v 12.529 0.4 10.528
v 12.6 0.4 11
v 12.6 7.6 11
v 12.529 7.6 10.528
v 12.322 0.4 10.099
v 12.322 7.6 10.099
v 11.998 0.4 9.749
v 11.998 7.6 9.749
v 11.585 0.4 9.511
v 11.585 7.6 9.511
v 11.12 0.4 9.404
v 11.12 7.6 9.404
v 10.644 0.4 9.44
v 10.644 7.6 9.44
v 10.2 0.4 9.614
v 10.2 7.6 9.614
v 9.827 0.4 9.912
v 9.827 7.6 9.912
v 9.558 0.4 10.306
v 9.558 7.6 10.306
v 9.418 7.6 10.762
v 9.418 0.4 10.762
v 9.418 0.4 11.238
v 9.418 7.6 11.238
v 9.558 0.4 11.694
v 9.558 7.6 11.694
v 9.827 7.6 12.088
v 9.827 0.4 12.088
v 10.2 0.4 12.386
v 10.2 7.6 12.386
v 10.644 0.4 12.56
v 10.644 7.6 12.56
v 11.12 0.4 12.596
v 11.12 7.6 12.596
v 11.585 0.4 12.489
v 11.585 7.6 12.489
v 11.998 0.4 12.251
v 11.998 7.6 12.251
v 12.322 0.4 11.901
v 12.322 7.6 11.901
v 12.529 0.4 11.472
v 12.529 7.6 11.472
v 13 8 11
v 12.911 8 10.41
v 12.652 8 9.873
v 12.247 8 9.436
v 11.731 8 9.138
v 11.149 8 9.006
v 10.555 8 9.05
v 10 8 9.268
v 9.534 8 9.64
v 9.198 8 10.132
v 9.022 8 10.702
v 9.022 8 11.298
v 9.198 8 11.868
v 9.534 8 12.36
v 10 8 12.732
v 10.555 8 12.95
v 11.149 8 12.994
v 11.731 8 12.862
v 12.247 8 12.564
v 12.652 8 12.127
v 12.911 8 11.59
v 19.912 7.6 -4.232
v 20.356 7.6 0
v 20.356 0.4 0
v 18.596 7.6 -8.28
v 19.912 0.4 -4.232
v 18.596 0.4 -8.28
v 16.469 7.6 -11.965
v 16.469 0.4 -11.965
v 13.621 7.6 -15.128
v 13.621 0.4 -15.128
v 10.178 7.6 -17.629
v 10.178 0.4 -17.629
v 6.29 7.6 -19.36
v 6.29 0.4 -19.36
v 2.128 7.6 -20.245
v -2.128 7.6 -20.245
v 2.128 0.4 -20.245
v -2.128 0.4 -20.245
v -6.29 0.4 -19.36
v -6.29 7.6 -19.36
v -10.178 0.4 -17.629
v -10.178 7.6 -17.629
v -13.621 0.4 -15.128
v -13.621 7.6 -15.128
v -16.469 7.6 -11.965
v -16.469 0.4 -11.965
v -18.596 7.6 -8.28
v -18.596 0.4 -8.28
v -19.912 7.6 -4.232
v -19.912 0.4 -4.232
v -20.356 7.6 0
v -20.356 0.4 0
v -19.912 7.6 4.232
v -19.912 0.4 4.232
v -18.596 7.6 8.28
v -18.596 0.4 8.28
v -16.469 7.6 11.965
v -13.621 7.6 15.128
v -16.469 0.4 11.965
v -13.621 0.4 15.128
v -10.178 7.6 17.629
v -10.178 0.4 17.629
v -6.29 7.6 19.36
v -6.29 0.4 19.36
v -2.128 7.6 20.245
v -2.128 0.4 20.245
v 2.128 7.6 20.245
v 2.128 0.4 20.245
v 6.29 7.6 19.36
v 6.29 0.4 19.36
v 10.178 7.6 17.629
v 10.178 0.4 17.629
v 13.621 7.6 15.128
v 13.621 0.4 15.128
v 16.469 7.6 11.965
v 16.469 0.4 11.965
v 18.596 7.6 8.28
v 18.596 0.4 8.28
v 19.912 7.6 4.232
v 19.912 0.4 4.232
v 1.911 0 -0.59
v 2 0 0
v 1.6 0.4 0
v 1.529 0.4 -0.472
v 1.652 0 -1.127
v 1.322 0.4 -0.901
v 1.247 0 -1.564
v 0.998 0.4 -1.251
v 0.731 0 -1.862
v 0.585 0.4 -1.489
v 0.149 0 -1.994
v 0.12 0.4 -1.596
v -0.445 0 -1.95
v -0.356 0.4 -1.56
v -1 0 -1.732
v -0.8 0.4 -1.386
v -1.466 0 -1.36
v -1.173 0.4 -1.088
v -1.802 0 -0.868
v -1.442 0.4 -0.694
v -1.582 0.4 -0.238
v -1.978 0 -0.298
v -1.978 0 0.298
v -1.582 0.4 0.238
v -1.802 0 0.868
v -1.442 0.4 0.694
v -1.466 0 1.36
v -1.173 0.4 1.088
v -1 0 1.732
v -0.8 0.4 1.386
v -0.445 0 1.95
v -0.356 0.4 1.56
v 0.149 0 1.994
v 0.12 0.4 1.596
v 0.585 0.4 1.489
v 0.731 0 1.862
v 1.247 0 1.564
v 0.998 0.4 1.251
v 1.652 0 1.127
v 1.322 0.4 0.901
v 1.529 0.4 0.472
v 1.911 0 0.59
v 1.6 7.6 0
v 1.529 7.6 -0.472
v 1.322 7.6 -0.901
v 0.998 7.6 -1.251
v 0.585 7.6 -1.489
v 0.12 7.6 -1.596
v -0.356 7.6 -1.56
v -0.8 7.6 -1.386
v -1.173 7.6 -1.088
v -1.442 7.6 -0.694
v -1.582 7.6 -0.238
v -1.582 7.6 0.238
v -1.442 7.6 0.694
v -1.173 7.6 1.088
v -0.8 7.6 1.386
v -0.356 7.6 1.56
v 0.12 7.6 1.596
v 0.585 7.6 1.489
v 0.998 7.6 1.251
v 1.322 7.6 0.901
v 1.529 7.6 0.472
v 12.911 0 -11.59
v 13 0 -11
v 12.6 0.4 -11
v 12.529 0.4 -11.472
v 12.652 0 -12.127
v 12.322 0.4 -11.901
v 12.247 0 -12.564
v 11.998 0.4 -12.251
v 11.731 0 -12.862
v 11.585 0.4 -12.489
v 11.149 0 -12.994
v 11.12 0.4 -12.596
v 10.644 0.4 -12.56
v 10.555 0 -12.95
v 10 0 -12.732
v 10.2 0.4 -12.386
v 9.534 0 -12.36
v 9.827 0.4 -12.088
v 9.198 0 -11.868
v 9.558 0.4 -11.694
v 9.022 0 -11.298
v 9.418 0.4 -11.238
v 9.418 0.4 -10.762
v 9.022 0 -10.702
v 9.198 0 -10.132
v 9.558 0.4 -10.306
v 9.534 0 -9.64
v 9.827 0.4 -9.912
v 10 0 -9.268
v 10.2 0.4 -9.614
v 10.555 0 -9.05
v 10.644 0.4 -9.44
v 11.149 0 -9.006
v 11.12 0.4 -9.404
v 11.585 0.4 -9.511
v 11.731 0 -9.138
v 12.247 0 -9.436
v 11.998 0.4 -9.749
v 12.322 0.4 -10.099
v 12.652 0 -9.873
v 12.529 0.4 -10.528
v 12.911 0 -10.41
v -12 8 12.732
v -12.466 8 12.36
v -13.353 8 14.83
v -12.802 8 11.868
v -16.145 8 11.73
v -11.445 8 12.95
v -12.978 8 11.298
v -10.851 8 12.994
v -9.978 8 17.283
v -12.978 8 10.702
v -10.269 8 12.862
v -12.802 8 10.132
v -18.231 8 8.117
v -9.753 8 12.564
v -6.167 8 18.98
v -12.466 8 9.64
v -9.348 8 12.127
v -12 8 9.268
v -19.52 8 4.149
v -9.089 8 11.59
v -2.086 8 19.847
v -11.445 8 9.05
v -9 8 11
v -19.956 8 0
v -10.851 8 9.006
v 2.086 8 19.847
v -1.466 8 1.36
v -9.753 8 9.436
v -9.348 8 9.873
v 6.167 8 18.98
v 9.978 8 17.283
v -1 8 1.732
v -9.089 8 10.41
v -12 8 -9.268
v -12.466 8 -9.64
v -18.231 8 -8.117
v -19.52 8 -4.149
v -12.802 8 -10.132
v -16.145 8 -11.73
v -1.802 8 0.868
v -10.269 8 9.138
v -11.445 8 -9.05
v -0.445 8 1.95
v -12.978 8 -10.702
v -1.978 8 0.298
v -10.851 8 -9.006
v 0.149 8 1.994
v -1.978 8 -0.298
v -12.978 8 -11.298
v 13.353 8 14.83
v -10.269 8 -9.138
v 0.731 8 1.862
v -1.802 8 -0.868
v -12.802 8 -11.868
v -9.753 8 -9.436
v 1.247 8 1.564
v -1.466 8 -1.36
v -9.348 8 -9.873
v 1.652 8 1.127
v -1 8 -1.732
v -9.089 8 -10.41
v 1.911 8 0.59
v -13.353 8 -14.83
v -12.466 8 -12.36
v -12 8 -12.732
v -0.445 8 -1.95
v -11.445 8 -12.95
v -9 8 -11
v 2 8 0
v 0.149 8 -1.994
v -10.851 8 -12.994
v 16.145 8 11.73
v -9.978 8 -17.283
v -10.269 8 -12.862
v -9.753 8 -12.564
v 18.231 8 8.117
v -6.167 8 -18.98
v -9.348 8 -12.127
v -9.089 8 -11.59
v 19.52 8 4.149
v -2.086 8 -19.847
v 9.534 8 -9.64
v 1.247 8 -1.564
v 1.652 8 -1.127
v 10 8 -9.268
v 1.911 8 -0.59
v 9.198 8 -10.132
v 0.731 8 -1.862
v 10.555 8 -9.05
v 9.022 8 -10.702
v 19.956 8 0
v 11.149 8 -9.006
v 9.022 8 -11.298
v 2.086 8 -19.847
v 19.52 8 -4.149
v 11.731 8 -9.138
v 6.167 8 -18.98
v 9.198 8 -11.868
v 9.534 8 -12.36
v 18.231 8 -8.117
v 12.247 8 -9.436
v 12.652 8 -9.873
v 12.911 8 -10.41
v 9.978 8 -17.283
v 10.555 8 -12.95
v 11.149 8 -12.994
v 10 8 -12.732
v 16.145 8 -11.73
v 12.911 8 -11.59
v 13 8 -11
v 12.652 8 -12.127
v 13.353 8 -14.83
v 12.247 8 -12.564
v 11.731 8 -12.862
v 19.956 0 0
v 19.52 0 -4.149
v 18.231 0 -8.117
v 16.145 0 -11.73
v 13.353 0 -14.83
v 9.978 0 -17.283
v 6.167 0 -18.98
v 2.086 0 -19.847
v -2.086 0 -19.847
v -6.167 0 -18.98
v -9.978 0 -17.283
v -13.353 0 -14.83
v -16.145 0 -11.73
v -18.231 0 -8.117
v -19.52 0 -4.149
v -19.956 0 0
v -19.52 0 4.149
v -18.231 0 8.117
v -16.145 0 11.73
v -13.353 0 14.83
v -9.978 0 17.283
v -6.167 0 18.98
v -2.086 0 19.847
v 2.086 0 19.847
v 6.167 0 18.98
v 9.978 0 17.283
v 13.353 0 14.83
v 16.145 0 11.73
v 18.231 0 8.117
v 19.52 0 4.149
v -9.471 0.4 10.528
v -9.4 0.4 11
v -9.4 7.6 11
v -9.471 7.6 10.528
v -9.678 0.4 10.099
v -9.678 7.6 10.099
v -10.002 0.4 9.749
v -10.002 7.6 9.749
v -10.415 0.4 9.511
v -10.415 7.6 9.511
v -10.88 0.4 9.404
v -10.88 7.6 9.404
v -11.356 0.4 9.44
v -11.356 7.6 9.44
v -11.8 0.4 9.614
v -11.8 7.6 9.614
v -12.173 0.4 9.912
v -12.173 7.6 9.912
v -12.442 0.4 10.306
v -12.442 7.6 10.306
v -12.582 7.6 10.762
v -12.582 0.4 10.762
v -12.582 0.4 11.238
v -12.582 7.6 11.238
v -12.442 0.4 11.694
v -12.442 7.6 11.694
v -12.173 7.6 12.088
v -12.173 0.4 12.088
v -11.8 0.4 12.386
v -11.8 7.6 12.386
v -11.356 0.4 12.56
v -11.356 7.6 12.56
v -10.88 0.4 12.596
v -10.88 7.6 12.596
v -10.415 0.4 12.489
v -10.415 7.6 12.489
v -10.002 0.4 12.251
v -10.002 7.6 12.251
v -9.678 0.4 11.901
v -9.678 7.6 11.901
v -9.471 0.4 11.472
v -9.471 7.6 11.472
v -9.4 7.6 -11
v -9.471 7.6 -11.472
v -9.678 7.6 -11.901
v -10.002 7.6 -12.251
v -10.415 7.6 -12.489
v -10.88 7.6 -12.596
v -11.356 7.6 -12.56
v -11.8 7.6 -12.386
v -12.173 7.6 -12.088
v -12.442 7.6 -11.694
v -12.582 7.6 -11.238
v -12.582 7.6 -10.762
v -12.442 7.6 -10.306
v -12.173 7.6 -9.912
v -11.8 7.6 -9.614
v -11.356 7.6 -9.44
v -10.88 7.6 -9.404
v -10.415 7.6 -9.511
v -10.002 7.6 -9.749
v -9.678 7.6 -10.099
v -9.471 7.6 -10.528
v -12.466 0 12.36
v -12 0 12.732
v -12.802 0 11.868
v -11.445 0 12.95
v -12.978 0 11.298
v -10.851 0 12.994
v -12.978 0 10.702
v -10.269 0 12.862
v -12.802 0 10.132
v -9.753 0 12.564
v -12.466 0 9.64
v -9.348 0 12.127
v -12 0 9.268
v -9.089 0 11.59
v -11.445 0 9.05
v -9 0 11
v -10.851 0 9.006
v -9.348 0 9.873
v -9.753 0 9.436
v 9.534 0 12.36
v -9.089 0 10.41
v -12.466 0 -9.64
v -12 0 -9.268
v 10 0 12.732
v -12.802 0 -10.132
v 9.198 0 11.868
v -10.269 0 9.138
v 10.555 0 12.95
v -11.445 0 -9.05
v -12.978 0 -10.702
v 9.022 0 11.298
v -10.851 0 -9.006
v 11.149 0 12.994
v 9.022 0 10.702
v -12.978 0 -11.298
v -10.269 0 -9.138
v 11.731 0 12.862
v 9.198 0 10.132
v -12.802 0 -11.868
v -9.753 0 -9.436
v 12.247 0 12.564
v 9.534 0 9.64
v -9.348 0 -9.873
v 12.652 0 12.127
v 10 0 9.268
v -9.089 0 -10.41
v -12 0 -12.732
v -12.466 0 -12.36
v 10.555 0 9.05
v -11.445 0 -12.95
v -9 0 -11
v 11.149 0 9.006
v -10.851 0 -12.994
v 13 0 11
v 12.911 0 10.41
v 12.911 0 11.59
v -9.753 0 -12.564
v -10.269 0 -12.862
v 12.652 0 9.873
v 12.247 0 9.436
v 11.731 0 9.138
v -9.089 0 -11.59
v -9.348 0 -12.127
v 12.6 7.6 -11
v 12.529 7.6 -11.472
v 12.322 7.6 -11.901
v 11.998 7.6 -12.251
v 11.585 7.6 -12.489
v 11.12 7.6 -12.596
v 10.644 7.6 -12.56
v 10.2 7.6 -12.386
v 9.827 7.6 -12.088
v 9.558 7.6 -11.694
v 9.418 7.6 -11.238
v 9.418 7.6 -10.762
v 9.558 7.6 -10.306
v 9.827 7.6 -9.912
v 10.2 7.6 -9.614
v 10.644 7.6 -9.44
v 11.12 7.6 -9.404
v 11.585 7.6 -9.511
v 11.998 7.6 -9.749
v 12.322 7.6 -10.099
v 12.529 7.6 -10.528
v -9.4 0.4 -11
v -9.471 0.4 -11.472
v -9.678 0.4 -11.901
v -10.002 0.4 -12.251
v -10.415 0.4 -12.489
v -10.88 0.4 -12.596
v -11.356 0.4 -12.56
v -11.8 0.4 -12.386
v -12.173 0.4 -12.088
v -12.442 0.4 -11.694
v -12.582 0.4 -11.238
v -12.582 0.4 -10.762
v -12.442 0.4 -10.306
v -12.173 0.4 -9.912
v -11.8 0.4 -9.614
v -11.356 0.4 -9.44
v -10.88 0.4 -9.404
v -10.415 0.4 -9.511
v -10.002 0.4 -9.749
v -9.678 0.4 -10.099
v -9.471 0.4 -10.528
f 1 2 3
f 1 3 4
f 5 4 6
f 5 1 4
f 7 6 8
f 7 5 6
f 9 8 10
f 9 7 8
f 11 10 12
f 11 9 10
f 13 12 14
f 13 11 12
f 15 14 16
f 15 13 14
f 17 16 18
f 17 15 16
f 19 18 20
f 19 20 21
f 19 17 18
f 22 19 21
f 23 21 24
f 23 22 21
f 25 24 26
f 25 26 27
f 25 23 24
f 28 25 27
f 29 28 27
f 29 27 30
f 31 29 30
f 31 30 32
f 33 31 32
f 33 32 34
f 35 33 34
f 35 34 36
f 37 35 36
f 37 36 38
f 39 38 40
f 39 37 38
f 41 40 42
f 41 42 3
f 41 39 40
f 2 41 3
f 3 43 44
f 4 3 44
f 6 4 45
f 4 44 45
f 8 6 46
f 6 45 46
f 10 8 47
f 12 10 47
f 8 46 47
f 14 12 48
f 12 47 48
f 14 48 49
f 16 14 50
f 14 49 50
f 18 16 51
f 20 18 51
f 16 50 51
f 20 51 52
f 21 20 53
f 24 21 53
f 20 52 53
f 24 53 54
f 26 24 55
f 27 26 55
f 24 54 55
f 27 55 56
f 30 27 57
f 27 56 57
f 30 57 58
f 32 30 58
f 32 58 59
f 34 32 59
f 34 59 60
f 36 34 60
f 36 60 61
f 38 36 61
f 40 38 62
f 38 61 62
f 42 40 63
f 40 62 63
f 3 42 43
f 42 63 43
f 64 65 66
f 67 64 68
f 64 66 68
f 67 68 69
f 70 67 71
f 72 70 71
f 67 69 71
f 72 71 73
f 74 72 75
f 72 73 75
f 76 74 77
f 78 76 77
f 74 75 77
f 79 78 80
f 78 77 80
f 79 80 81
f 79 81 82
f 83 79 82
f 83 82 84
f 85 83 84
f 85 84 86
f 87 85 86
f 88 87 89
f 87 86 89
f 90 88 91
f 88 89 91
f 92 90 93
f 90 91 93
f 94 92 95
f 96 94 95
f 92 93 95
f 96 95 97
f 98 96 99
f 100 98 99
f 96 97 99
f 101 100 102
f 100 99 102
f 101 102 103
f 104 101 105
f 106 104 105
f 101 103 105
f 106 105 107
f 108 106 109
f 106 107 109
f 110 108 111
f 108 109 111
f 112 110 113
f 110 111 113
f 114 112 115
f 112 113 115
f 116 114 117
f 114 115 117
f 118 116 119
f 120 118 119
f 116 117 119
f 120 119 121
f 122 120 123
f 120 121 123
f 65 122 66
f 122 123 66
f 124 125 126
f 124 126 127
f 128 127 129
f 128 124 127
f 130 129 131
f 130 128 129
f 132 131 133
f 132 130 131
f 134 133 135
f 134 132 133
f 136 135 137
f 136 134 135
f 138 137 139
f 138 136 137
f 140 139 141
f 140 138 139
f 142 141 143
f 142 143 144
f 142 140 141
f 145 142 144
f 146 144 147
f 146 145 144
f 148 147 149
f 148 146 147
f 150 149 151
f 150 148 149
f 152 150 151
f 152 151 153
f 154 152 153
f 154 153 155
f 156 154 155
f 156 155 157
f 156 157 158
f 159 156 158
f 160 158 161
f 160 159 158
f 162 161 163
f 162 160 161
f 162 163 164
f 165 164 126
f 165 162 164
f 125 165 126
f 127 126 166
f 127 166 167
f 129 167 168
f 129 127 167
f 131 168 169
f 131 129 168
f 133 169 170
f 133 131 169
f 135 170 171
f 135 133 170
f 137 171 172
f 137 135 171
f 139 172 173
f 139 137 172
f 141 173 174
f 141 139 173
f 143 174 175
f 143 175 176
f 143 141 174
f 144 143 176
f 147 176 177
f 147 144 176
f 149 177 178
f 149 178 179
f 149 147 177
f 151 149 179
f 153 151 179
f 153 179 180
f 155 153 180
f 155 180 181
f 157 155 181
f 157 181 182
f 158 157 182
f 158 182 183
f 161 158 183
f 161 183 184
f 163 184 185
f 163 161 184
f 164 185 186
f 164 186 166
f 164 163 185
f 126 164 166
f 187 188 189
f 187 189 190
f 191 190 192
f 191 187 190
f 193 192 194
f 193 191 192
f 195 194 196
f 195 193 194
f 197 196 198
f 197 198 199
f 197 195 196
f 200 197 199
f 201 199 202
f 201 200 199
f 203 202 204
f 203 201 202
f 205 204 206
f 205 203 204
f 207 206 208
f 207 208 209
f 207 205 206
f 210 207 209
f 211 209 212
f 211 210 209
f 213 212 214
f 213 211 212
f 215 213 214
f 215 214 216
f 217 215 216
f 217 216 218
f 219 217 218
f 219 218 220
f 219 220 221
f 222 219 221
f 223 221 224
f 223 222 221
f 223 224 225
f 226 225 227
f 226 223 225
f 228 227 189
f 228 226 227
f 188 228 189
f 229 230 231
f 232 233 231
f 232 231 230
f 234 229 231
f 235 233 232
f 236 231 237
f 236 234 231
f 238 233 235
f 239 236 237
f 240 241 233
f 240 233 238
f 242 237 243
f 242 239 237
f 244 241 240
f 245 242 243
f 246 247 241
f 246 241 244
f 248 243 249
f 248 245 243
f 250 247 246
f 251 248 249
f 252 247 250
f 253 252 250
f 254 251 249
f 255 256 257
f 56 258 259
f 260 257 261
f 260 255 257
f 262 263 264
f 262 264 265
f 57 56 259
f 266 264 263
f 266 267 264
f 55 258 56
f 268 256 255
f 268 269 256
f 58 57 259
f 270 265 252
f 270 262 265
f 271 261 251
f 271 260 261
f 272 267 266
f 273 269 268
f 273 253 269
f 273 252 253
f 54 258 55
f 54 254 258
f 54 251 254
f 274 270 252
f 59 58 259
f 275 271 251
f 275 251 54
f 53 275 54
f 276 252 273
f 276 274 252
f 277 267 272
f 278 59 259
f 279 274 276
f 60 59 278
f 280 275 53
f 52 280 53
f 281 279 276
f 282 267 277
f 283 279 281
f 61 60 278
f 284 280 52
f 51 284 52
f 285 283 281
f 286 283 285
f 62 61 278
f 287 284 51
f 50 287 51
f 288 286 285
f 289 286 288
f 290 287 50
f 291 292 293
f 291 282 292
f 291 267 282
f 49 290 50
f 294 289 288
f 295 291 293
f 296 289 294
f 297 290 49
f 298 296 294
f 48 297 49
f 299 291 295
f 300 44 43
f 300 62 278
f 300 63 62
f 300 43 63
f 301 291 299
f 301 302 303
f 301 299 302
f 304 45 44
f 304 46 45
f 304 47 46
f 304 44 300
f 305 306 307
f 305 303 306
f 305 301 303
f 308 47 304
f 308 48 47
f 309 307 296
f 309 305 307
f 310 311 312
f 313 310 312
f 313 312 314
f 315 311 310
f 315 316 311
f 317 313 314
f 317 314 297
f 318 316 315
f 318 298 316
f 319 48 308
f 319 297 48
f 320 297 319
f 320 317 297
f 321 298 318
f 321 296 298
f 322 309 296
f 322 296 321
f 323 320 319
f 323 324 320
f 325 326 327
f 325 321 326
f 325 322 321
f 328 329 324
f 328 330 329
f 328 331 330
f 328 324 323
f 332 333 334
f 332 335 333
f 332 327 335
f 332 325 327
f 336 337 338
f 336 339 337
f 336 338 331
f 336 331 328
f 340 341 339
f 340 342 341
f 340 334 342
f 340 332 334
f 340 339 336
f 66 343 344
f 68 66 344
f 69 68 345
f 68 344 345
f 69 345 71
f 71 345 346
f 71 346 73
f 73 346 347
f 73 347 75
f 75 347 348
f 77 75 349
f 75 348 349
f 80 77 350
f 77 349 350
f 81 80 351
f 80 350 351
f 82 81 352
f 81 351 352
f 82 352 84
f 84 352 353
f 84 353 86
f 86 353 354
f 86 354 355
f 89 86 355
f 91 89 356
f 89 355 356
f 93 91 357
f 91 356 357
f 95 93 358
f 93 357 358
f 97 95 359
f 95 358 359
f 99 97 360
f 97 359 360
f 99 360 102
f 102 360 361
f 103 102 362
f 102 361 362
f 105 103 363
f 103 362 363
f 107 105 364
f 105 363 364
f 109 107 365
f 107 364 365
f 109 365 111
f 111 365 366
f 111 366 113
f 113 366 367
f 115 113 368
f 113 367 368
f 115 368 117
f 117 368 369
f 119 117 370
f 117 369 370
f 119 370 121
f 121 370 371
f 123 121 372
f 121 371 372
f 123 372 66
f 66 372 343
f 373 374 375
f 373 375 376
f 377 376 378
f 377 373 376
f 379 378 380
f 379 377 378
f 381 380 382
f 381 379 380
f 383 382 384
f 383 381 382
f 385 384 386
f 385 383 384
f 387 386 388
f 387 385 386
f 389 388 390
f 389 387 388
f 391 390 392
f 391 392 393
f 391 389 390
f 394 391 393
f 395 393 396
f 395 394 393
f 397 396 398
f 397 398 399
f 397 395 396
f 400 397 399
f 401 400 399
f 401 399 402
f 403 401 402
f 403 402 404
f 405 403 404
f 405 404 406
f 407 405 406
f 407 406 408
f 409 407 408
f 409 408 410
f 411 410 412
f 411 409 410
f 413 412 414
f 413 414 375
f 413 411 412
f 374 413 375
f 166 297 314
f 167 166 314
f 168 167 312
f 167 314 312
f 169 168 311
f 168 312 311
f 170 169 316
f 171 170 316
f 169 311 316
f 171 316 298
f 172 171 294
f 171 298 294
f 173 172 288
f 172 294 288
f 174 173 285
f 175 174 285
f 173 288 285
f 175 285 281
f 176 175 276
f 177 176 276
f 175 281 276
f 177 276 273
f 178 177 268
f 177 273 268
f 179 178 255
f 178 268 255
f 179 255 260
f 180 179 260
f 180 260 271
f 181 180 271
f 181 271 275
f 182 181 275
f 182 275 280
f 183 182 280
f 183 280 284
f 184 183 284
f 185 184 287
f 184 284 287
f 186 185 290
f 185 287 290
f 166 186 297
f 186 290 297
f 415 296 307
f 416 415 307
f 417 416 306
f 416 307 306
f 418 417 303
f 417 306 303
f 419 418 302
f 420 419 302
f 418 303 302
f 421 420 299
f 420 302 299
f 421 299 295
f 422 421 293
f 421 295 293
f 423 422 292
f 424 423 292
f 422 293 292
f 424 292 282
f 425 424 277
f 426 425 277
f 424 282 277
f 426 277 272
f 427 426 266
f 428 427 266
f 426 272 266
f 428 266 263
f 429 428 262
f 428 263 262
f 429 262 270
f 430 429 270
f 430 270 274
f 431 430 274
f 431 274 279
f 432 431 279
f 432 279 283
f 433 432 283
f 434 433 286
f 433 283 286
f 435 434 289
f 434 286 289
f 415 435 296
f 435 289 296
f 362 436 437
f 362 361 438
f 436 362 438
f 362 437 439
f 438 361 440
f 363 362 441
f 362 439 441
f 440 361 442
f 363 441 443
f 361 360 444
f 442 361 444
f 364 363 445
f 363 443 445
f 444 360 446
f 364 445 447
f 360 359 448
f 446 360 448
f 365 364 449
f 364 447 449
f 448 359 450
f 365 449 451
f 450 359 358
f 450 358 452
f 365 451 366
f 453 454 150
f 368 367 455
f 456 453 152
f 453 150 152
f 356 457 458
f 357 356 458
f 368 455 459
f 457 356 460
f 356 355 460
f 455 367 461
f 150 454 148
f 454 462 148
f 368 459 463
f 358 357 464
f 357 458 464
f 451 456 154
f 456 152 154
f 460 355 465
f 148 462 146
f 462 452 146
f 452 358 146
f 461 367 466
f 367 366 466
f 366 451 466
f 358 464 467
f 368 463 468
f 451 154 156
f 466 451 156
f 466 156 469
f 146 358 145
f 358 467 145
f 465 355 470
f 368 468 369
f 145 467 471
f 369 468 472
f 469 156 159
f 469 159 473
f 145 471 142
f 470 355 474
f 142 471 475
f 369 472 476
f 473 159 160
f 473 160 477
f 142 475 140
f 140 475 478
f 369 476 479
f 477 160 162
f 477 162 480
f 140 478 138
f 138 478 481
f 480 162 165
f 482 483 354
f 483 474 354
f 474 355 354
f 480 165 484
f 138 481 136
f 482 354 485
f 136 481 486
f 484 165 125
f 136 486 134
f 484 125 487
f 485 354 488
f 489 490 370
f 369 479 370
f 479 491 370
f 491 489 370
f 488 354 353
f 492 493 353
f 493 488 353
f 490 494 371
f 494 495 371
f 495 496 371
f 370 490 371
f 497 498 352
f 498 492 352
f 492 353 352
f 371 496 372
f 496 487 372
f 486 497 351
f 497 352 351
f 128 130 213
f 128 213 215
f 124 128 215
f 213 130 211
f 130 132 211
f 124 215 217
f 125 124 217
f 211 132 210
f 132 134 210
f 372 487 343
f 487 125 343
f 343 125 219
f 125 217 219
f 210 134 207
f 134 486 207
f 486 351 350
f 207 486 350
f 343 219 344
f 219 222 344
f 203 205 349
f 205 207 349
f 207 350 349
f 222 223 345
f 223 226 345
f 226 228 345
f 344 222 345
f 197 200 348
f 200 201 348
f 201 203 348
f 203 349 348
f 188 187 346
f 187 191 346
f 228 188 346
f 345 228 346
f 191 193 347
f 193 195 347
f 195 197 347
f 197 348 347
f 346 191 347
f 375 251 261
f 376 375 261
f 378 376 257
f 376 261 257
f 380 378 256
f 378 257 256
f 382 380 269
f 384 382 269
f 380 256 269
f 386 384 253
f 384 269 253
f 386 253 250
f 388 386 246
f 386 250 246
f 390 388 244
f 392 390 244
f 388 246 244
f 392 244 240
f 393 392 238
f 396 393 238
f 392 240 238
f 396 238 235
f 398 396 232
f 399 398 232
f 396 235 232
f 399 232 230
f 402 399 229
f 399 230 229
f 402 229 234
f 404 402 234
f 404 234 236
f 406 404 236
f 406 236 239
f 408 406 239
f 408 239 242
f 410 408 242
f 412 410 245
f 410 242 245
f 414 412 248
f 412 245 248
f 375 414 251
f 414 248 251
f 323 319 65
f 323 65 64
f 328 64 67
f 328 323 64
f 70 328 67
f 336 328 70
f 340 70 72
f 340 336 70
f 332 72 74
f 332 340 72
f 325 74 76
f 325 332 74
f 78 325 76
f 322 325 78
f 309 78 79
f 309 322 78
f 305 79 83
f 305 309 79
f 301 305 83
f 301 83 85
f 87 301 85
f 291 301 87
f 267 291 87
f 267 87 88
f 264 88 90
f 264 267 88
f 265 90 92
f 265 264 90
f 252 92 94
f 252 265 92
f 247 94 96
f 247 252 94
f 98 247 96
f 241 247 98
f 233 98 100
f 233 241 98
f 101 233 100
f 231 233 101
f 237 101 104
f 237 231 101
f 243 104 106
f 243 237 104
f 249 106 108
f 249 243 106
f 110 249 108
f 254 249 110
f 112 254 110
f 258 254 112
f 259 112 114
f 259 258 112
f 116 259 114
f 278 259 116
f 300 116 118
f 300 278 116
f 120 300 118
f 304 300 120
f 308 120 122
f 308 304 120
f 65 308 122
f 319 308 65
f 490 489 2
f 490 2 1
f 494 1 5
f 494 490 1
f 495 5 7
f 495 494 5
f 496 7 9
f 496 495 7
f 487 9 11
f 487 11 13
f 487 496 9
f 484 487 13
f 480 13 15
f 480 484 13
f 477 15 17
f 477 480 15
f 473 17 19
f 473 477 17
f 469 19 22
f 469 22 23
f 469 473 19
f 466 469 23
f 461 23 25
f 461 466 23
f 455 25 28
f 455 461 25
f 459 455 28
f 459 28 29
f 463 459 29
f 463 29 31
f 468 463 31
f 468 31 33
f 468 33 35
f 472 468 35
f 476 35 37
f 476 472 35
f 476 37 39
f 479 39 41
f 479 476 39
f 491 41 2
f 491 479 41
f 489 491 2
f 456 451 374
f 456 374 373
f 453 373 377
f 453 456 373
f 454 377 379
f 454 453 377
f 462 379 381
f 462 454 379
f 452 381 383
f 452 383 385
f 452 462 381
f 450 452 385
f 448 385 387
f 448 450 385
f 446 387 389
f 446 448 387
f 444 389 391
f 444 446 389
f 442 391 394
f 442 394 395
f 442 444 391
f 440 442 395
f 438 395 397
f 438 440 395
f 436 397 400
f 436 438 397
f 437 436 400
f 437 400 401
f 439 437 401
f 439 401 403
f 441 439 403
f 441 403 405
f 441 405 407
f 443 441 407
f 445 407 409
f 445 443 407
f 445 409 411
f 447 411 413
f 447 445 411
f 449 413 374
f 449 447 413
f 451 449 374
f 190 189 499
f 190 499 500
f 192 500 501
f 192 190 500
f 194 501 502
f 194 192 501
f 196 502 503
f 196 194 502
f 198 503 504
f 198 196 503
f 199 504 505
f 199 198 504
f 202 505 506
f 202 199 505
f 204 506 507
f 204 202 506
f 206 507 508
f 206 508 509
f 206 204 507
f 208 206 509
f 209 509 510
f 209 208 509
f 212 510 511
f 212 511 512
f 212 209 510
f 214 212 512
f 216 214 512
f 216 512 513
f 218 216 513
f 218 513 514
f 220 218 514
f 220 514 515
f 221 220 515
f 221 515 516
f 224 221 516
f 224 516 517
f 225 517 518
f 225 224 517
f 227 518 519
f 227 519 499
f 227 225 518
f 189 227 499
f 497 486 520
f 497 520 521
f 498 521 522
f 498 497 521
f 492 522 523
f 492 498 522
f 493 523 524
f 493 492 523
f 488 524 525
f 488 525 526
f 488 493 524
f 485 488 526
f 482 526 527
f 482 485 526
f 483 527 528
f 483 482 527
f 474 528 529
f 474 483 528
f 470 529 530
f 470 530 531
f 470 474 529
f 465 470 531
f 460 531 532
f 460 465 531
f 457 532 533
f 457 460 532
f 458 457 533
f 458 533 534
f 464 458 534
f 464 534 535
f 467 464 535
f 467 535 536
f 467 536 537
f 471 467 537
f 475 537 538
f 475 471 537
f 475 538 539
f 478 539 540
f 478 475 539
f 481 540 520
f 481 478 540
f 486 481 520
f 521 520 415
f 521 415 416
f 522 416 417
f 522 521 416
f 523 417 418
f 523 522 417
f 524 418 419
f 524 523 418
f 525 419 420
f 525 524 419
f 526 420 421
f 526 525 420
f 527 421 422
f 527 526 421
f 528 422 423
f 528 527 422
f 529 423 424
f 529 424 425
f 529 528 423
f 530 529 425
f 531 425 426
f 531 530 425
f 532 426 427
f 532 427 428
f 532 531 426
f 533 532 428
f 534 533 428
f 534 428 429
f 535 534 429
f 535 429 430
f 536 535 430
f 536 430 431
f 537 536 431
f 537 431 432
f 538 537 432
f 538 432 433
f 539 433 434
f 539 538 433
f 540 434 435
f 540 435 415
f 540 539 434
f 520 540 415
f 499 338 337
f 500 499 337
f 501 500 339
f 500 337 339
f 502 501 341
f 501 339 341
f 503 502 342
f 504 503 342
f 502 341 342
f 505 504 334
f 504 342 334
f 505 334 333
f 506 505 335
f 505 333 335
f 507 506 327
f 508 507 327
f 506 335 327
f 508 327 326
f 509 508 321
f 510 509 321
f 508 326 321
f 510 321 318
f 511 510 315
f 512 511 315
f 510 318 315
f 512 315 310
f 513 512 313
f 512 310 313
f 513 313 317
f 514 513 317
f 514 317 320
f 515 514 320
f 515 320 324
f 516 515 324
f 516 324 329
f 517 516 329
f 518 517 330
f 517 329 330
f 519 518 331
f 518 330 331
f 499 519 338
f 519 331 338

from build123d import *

# Parameters (mm, degrees)
SKETCH1_R           = 20.356349186
SKETCH1_R_2         = 1.6
BOSS_EXTRUDE1_DEPTH = 8
CHAMFER1_SIZE       = 0.4


with BuildPart() as part:
    # Sketch1 → Boss-Extrude1 (new body)
    with BuildSketch(Plane(origin=(0, 0, 0), x_dir=(1, 0, 0), z_dir=(0, 1, 0))):
        Circle(SKETCH1_R)
        Circle(SKETCH1_R_2, mode=Mode.SUBTRACT)
        with Locations((-11, 11)):
            Circle(SKETCH1_R_2, mode=Mode.SUBTRACT)
        with Locations((11, 11)):
            Circle(SKETCH1_R_2, mode=Mode.SUBTRACT)
        with Locations((11, -11)):
            Circle(SKETCH1_R_2, mode=Mode.SUBTRACT)
        with Locations((-11, -11)):
            Circle(SKETCH1_R_2, mode=Mode.SUBTRACT)
    extrude(amount=BOSS_EXTRUDE1_DEPTH)

    # Chamfer1
    chamfer1_edges = [part.edges().sort_by_distance(p)[0] for p in [
        (9.4, 0, -11),
        (9.4, 8, -11),
        (9.4, 0, 11),
        (9.4, 8, 11),
        (-20.356349186, 0, 0),
        (-12.6, 0, 11),
        (-12.6, 8, 11),
        (-20.356349186, 8, 0),
        (-1.6, 0, 0),
        (-1.6, 8, 0),
        (-12.6, 0, -11),
        (-12.6, 8, -11),
    ]]
    chamfer(chamfer1_edges, length=CHAMFER1_SIZE)


solid = part.part
